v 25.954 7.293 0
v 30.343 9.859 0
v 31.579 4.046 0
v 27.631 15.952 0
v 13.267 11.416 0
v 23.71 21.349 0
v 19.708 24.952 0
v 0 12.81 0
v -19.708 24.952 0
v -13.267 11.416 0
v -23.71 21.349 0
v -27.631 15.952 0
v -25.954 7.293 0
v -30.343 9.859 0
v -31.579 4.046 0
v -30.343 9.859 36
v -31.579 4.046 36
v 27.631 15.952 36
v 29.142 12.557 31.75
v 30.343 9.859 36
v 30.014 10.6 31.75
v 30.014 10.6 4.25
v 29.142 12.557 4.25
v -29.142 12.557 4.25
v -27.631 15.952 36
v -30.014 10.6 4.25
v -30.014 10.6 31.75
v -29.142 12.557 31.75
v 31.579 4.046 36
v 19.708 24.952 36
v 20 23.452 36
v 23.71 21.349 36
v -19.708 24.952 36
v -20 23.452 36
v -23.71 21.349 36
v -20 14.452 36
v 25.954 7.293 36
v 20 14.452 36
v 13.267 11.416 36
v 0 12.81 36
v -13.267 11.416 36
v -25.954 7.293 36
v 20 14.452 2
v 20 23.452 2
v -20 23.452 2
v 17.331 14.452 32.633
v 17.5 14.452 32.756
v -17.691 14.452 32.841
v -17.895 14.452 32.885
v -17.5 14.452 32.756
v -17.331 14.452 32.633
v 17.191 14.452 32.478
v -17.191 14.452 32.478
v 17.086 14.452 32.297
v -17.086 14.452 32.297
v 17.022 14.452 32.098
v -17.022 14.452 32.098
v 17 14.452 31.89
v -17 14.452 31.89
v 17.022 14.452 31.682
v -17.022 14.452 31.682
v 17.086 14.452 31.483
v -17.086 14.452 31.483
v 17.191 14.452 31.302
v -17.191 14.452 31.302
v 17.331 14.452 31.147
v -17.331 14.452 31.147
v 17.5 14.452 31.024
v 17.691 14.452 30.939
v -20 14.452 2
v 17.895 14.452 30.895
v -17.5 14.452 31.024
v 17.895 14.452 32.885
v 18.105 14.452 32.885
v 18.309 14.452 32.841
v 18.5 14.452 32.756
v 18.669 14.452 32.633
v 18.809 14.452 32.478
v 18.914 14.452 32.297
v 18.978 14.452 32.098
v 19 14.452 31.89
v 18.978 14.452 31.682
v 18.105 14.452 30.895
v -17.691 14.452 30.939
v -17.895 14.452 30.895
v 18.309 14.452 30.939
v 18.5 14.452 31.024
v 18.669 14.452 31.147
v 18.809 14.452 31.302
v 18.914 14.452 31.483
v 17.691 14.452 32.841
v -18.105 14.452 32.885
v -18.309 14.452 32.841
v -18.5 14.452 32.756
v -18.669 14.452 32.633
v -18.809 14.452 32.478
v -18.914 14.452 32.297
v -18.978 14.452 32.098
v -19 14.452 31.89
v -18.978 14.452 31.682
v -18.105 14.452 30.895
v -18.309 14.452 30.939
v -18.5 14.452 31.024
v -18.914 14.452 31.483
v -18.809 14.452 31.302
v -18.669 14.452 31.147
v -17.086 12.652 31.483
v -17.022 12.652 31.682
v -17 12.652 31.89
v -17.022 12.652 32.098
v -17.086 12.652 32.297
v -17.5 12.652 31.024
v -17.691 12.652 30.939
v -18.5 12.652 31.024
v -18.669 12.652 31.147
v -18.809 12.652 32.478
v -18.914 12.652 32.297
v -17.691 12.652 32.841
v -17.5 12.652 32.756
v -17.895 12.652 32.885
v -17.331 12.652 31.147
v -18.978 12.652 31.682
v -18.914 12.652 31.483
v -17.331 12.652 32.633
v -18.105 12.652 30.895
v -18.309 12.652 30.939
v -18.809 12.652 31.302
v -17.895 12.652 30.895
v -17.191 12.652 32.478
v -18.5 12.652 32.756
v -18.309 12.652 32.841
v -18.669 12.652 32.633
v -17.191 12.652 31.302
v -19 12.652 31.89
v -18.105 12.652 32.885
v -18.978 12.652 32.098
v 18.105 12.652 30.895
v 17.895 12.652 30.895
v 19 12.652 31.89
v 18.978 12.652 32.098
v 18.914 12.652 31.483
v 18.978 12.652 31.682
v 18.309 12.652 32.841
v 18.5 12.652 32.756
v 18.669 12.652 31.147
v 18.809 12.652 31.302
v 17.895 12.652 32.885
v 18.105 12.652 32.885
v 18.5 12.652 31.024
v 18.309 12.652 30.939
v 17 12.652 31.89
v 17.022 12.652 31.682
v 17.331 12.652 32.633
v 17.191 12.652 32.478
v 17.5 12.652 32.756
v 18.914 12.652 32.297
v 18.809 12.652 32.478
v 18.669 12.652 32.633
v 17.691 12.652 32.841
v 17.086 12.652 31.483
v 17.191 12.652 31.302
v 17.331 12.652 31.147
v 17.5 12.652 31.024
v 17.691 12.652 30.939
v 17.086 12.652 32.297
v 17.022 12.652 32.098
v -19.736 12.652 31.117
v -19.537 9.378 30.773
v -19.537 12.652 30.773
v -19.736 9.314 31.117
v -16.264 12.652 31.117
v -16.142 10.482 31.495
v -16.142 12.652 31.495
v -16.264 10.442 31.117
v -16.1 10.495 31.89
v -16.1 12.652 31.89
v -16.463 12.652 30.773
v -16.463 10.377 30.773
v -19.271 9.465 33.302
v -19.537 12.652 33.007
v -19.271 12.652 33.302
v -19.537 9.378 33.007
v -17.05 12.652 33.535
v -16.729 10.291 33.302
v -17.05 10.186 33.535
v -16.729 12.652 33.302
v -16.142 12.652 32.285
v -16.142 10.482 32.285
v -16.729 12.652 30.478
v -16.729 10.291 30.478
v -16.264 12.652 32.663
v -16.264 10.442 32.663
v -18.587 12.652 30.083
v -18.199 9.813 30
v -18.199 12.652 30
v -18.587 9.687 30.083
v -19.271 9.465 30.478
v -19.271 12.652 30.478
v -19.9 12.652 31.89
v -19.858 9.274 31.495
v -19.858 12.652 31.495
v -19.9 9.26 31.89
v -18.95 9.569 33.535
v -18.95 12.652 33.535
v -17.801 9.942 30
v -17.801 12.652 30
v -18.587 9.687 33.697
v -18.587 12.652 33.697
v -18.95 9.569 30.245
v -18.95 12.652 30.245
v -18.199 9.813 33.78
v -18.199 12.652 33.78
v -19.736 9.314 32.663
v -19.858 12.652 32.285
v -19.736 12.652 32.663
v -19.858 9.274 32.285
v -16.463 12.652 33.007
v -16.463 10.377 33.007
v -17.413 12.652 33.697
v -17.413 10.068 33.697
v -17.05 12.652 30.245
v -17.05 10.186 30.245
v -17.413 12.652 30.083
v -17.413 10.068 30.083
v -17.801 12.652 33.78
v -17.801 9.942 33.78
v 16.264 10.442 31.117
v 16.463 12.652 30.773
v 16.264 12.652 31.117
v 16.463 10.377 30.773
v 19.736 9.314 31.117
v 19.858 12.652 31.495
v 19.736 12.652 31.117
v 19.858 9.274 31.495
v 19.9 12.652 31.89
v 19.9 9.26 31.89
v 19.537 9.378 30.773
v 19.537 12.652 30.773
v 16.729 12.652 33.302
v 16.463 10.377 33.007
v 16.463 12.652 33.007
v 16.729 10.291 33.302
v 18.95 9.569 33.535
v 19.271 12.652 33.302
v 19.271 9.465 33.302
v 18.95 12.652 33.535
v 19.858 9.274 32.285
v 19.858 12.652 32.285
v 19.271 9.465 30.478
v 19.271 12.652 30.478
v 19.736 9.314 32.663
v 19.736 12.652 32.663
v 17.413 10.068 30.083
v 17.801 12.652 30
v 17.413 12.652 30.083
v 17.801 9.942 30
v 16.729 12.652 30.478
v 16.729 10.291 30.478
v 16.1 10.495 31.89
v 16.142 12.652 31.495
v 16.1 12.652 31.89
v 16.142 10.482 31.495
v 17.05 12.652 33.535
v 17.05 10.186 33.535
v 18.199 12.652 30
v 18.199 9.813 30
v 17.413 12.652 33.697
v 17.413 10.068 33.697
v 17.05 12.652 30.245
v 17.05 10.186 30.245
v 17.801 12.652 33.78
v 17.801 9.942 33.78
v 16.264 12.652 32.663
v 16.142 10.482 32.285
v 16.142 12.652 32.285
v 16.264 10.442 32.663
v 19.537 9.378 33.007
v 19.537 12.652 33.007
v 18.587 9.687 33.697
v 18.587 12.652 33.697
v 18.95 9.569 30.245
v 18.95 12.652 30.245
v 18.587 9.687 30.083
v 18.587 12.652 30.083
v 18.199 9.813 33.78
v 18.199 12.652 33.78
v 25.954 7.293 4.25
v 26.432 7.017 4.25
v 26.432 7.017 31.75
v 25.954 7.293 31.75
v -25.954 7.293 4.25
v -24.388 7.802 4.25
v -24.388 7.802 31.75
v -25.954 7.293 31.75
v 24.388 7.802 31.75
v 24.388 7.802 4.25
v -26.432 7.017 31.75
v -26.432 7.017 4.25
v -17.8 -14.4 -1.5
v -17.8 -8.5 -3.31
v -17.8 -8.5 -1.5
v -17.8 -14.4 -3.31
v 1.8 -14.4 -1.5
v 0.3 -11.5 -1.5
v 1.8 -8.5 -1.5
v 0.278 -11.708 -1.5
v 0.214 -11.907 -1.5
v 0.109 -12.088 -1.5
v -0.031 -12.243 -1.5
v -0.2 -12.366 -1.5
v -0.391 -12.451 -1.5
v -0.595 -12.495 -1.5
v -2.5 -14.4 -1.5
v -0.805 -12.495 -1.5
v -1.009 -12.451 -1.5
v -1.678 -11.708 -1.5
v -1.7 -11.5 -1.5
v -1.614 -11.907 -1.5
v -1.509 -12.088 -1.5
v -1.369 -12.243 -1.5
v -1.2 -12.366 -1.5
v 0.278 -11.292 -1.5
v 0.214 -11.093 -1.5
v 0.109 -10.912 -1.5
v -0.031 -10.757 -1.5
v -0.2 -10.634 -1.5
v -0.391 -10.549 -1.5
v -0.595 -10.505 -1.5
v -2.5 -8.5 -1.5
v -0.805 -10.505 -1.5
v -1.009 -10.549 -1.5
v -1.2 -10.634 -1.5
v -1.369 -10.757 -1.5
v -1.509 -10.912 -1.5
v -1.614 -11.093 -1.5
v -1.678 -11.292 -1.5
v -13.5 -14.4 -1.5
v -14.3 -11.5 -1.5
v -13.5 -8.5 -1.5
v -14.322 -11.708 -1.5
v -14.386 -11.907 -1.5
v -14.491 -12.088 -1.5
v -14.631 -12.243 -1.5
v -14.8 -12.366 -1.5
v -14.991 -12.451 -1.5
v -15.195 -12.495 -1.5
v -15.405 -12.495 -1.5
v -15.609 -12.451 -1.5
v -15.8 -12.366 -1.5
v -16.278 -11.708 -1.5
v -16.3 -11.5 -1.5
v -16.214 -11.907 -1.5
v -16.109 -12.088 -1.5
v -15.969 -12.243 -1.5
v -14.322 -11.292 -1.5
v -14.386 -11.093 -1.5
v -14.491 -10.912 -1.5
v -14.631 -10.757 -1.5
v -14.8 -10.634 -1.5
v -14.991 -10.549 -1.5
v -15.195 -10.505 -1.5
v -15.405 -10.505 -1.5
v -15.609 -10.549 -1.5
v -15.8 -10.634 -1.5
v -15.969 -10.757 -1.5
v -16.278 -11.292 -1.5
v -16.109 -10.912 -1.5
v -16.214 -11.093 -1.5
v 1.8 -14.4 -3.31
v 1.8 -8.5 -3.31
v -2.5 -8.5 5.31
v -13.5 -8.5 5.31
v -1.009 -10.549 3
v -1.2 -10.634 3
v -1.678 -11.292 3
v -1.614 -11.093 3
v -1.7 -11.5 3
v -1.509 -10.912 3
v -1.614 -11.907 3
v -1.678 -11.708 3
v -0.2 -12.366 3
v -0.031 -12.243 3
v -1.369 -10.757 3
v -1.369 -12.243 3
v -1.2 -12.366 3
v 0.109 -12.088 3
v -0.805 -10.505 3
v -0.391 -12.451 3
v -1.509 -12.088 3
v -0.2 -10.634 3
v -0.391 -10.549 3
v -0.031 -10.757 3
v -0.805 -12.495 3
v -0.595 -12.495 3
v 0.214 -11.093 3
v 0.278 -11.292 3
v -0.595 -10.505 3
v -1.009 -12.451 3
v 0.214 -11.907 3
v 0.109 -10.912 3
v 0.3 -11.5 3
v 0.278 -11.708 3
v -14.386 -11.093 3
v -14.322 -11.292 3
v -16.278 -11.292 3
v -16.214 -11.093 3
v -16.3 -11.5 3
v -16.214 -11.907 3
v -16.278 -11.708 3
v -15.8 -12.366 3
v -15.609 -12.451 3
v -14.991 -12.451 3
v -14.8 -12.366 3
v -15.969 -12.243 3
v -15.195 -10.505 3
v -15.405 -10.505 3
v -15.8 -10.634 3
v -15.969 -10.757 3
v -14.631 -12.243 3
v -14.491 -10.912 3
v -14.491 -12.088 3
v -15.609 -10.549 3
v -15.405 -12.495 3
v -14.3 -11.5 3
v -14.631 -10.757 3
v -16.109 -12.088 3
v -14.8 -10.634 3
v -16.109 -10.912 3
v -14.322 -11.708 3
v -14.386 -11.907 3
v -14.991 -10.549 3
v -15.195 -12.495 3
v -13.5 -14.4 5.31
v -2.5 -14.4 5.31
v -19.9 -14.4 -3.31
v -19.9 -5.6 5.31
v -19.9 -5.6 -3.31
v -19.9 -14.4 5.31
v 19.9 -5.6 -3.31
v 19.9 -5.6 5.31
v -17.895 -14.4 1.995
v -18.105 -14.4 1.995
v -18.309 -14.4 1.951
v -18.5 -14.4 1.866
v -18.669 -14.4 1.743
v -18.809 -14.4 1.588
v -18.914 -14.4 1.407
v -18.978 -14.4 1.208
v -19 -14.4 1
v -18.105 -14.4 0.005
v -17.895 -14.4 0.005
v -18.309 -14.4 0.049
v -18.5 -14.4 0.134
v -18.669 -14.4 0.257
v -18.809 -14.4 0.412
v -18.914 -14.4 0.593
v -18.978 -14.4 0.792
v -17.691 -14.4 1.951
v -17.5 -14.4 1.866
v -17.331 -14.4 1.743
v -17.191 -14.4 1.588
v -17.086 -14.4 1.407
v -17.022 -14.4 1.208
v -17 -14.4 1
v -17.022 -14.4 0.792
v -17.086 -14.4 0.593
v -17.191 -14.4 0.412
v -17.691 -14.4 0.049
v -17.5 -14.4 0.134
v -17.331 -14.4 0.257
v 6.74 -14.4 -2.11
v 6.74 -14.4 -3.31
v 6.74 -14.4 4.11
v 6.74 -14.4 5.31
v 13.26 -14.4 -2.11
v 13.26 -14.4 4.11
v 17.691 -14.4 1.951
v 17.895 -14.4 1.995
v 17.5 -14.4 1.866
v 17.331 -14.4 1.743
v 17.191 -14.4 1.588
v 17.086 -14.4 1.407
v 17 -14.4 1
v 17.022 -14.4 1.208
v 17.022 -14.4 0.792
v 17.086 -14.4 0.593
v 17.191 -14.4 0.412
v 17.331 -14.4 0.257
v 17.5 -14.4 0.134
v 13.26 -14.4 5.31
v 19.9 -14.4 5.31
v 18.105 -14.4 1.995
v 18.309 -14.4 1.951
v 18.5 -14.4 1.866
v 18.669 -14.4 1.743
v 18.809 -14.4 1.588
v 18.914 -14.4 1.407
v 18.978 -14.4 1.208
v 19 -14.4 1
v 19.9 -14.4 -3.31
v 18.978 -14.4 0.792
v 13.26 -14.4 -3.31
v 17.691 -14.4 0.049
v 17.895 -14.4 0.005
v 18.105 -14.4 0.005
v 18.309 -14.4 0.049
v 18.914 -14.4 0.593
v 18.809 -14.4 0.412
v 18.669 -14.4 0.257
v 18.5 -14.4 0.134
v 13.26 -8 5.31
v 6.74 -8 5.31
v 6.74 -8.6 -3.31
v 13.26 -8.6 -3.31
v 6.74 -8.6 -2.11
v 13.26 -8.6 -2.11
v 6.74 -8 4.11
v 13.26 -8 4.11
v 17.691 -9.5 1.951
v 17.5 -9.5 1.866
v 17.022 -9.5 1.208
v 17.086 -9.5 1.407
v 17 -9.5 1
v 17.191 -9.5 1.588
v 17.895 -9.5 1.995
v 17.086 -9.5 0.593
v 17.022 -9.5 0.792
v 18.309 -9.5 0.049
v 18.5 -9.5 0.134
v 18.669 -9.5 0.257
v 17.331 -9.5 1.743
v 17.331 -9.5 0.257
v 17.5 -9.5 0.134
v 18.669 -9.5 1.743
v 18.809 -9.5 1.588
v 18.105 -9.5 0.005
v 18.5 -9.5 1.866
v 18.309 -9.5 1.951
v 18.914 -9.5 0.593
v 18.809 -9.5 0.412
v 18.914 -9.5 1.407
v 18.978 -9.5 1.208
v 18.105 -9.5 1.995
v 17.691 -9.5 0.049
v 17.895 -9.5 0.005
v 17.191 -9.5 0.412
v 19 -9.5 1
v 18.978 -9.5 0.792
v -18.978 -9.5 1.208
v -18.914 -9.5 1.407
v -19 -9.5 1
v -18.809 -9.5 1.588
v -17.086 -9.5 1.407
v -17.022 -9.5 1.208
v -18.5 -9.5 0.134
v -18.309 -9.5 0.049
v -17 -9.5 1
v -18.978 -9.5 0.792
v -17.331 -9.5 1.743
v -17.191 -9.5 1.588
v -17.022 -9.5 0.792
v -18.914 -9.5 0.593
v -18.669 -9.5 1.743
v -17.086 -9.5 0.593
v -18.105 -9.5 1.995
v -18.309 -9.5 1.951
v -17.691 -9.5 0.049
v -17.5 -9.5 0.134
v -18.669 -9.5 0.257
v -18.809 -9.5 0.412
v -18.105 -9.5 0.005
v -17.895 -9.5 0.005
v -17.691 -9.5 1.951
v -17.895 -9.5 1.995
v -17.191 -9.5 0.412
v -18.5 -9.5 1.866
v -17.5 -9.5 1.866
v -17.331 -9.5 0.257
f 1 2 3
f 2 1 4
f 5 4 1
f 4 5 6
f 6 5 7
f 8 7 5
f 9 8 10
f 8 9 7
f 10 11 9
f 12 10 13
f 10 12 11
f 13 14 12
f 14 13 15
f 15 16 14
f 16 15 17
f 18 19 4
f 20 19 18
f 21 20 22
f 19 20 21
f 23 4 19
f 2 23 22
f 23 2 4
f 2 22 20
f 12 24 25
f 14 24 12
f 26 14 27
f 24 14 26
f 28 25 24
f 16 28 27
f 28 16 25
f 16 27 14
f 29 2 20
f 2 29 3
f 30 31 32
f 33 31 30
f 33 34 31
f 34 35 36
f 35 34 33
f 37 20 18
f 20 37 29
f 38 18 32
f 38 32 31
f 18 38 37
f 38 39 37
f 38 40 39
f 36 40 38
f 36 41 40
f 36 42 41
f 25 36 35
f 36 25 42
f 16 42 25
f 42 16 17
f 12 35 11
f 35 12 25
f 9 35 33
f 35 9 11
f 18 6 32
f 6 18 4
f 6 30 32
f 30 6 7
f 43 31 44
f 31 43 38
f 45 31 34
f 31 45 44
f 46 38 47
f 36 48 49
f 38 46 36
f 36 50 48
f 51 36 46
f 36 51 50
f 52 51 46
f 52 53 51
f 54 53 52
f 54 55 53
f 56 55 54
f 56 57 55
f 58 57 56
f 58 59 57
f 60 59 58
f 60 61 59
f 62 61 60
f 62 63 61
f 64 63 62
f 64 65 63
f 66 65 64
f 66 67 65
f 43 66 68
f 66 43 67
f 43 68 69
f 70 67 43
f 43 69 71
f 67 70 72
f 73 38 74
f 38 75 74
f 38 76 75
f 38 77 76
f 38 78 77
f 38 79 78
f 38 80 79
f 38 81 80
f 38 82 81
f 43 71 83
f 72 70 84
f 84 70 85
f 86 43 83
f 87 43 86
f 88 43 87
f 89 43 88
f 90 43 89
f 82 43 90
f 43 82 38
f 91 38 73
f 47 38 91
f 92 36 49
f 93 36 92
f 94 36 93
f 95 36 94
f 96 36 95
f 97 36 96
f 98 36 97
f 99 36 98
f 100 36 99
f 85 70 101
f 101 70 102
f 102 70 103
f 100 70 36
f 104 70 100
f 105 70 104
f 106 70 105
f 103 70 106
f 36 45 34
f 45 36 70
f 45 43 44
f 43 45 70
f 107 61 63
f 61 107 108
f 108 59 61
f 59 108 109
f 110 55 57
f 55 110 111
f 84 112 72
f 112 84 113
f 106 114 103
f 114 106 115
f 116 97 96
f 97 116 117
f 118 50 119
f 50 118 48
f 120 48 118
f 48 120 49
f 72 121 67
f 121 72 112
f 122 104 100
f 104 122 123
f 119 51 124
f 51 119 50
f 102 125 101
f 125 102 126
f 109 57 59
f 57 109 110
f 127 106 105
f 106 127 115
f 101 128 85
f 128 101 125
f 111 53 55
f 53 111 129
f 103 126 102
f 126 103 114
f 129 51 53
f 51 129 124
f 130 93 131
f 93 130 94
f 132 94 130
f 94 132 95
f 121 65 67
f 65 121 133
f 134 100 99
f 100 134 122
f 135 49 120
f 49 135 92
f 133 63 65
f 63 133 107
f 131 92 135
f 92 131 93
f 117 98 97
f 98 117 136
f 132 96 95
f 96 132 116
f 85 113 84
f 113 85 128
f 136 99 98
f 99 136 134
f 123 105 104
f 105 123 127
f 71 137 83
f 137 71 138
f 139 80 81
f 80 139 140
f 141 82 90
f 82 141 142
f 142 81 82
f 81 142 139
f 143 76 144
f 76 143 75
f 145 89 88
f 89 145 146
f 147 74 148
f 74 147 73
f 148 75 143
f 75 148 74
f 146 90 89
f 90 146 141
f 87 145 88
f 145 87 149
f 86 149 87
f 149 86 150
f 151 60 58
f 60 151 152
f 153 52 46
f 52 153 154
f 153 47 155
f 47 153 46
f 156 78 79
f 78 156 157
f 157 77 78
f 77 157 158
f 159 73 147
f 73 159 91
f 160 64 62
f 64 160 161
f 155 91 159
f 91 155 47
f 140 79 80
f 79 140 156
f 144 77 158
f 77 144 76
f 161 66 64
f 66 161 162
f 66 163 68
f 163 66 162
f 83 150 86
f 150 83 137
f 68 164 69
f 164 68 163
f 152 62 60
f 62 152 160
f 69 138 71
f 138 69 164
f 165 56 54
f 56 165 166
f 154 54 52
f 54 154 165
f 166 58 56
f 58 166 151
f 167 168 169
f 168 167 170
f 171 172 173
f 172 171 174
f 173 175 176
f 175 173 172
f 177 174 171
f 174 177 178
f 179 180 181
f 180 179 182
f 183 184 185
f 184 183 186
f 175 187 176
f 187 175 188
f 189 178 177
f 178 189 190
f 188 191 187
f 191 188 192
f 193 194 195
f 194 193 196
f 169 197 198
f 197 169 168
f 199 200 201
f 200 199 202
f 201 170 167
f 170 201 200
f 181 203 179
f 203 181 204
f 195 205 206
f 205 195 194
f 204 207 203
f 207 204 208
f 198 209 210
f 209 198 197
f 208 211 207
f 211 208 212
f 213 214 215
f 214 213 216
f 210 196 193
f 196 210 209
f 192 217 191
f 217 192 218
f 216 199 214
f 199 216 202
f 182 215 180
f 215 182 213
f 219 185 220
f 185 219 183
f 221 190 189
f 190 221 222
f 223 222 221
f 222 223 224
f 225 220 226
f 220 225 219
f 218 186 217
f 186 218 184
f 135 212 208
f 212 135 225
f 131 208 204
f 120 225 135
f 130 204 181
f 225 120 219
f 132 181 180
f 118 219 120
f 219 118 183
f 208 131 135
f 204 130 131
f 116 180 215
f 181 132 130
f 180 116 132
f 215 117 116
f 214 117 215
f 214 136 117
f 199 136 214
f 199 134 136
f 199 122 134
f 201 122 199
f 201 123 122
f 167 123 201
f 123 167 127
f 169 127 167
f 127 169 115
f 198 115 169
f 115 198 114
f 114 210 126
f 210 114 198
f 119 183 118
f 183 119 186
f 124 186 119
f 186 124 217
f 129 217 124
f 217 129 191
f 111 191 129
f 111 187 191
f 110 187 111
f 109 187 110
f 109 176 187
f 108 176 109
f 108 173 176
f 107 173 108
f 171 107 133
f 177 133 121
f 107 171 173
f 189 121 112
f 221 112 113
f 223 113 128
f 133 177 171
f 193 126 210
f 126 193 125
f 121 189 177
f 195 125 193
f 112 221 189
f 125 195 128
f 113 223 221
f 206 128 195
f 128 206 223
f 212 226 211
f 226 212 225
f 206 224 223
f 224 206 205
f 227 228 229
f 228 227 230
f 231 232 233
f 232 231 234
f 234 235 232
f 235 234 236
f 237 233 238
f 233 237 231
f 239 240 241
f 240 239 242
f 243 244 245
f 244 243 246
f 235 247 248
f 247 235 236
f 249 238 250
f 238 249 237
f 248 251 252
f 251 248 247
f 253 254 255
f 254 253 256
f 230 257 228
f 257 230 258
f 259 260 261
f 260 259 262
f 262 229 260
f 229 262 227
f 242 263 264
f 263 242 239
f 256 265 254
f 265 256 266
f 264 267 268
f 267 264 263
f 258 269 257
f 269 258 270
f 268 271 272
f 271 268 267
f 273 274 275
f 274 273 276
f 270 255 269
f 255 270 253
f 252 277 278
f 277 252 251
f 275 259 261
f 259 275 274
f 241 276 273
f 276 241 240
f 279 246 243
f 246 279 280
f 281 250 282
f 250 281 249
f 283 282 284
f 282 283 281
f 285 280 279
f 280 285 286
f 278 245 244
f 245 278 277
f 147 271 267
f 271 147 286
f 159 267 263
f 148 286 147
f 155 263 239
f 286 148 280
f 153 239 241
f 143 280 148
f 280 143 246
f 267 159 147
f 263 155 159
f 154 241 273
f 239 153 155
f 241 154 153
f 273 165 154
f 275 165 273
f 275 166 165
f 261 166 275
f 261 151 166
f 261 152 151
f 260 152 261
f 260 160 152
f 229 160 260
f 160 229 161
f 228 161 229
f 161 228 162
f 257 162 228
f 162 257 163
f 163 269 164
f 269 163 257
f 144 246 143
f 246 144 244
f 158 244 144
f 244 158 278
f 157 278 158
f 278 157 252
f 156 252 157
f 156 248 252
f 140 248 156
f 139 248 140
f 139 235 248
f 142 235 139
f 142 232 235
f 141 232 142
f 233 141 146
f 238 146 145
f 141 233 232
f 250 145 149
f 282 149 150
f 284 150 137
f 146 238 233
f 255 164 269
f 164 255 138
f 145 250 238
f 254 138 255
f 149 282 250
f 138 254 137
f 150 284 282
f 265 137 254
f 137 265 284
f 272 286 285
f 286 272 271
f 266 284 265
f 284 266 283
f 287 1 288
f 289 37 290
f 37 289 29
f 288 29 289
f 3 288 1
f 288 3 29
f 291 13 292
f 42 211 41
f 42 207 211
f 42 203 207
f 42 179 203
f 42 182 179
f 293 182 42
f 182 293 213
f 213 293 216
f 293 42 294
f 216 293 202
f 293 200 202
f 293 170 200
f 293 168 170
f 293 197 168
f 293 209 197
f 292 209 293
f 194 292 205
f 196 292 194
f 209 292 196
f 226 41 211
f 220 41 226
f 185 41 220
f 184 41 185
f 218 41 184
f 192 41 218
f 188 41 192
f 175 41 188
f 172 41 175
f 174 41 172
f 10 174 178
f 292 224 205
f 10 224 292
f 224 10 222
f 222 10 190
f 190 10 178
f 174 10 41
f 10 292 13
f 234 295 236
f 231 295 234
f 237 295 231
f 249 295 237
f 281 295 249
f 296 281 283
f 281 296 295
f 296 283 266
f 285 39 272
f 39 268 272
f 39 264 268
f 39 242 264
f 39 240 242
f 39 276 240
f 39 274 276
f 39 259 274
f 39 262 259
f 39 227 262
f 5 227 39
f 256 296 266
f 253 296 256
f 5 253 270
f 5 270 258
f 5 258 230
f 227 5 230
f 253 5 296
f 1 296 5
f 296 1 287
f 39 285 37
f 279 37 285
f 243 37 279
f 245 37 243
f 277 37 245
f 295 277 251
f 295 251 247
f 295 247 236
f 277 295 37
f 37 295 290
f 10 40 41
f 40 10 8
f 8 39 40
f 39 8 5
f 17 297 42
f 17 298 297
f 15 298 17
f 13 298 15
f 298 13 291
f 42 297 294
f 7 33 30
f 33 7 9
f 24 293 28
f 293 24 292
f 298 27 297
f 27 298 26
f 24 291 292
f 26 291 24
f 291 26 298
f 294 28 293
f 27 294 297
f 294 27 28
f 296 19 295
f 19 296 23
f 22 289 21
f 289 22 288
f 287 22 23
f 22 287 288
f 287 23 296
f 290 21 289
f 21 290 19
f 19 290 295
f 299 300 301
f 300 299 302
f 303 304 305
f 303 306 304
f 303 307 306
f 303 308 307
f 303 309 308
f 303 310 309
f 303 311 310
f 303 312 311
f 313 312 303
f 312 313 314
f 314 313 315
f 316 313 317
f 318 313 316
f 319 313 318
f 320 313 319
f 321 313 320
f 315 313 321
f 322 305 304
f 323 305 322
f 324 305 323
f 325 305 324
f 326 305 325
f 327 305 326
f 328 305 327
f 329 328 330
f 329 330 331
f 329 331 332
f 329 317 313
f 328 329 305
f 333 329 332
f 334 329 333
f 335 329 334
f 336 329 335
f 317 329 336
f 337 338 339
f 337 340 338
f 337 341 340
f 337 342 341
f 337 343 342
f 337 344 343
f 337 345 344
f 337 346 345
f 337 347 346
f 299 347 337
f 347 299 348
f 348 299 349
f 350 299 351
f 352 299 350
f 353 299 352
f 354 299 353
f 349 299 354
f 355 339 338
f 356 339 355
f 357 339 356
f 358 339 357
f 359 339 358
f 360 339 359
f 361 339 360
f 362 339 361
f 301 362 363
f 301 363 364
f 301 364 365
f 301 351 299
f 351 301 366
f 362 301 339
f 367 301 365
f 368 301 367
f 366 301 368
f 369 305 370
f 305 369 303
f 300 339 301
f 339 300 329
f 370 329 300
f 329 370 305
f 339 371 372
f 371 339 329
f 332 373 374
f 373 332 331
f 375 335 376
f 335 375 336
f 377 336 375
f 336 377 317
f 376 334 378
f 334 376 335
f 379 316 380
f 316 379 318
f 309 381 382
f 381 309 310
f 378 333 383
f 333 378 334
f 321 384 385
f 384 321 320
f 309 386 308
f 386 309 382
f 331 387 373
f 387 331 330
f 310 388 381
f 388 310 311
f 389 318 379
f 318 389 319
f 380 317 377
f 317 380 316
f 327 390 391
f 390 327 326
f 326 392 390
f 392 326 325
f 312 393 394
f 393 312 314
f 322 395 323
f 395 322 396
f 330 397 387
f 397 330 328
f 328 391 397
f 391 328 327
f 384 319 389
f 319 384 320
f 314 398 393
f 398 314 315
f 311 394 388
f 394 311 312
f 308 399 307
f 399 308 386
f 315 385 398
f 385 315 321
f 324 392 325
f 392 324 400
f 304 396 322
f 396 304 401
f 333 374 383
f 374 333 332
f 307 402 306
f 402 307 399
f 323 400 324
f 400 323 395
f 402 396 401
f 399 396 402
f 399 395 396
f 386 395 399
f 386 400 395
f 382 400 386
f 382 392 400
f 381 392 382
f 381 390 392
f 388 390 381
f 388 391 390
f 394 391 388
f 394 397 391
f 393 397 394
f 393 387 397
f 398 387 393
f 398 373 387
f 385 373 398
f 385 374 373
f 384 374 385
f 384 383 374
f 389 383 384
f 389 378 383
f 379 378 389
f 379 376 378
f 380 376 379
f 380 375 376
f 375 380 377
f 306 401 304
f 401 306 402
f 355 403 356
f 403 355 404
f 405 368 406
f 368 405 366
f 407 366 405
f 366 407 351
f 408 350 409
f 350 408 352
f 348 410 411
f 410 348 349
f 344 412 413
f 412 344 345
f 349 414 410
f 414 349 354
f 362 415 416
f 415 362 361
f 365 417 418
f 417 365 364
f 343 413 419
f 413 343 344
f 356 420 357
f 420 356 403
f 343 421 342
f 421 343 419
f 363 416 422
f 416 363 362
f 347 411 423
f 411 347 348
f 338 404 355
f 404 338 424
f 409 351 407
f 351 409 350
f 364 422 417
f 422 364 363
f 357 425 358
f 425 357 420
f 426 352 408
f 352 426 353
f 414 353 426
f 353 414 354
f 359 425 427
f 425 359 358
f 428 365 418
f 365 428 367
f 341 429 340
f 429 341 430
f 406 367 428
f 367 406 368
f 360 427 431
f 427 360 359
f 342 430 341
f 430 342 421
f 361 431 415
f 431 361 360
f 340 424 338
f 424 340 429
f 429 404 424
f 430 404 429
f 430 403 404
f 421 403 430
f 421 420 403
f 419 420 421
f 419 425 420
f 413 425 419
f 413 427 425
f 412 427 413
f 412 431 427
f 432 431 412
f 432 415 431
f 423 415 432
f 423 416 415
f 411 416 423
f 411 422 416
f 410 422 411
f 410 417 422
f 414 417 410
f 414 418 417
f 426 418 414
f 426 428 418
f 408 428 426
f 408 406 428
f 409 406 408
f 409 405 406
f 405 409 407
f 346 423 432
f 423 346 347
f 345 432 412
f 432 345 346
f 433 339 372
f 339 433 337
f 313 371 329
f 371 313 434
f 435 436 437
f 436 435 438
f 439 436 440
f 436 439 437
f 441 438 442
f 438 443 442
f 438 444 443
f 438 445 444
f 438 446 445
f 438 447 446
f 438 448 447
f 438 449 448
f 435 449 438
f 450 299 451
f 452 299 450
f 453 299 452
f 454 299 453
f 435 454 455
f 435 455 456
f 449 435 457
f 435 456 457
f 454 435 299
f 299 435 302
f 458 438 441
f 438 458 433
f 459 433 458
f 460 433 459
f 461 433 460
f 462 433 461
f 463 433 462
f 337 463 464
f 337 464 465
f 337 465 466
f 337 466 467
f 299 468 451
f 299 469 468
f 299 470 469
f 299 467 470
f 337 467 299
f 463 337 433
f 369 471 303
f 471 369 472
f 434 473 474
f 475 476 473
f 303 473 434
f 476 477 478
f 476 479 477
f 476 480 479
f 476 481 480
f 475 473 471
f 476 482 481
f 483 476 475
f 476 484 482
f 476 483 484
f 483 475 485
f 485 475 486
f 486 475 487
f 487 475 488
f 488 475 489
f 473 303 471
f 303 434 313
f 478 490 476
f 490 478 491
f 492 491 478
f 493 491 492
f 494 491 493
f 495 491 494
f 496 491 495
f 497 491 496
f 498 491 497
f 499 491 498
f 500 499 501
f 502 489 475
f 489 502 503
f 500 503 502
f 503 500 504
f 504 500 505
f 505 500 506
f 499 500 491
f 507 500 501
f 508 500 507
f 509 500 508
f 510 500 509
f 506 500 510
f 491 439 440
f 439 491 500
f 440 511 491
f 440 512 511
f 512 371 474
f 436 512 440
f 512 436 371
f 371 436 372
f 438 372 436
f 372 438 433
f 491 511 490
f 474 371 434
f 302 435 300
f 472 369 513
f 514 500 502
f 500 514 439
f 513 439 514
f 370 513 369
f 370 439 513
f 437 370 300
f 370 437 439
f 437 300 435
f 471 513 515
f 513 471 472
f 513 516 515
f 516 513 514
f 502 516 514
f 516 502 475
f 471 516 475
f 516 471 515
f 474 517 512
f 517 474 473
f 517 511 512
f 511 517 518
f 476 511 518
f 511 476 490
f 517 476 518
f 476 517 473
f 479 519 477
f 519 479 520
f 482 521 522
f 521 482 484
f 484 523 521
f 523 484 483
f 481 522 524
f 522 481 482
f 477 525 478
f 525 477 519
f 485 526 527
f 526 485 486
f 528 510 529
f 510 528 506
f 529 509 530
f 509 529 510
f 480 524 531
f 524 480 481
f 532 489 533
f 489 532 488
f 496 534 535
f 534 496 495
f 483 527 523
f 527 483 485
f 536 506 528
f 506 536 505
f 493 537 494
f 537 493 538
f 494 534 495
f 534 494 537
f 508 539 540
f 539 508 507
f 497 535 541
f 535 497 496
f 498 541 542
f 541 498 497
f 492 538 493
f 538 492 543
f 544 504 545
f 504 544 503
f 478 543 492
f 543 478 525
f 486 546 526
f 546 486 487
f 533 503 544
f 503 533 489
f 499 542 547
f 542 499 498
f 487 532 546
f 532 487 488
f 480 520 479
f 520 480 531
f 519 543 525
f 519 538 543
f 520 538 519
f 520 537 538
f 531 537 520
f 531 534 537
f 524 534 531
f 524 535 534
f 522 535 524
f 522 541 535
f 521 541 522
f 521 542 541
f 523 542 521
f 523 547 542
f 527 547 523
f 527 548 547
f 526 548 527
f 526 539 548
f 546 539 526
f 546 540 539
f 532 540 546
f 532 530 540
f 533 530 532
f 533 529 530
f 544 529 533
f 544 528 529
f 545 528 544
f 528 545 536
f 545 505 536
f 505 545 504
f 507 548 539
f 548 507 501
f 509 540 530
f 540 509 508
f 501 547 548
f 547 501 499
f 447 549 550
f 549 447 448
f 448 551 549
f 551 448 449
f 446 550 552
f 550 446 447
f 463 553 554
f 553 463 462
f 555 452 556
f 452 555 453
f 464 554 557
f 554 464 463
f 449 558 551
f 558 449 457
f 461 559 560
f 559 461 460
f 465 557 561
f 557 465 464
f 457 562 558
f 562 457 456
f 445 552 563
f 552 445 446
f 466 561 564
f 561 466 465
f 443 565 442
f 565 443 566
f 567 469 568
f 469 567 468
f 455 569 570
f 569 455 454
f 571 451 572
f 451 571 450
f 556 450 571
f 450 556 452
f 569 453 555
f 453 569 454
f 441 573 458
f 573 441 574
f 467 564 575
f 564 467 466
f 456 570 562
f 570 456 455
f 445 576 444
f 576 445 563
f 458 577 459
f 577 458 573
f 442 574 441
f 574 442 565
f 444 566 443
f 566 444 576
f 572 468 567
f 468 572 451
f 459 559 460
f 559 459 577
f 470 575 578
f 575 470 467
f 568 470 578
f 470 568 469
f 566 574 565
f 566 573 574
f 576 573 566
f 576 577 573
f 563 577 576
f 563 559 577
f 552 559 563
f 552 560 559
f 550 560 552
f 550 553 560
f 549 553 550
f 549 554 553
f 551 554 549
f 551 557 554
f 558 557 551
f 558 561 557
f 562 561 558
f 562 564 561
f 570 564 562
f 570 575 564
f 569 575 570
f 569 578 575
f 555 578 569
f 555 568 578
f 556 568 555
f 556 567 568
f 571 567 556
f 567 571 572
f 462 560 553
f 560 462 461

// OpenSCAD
//2020-09-16
//WristbandBattery.scad
//https://github.com/degenerator0/
//https://www.instructables.com/member/degenerator0/
//https://www.thingiverse.com/degenerator/
//Battery chassis for Laserclaw project


$fs=.01;

XH254_BACK_X=5.75;
XH254_BACK_Y=7.95;
XH254_BACK_Z=5.75;
XH254_FRONT_X=7.52;
XH254_FRONT_Y=6.22;
XH254_FRONT_Z=6.40;
XH254_X=XH254_BACK_X+XH254_FRONT_X;
XH254_Y=XH254_BACK_Y+XH254_FRONT_Y;
XH254_Z=XH254_BACK_Z+XH254_FRONT_Z;
BATTERY_X=40;
BATTERY_Y=20;
BATTERY_Z=9;
2P_F_BOT_X=4.0;
2P_F_BOT_Y=6.5;
2P_F_BOT_Z=.85;
2P_F_TOP_X=4.0;
2P_F_TOP_Y=4.61;
2P_F_TOP_Z=2.15-.85;
2P_F_Z=2P_F_TOP_Z+2P_F_BOT_Z;
2P_B_X=5.4;
2P_B_Y=4.61;
2P_B_Z=2.63;
2P_X=2P_F_BOT_X+2P_B_Y;
2P_Y=2P_F_BOT_Y;
2P_Z=(2P_F_TOP_Z/2+2P_F_BOT_Z/2+2P_B_Z/2)/3;
SSWITCH_B_X=11;
SSWITCH_B_Y=6;
SSWITCH_B_Z=4.5;
SSWITCH_P_X=19.6;
SSWITCH_P_Y=6;
SSWITCH_P_Z=1;
SSWITCH_T_X=1.4;
SSWITCH_T_Y=.4;
SSWITCH_T_Z=2.25;

WRISTBAND_H=36;
WRISTBAND_D=BATTERY_X+2P_X+5.2+9+1;

module XH254 () {
}

module slideswitch () {
    $fs=.01;
    union () {
    //plate

        cube ([SSWITCH_P_X,SSWITCH_P_Y,SSWITCH_P_Z], center = true);
        
        translate ([-SSWITCH_P_X/2+2.5,0,-SSWITCH_P_Z/2])
        cylinder (h=SSWITCH_B_Z*2, r=1, center = true);
            translate ([SSWITCH_P_X/2-2.5,0,-SSWITCH_P_Z/2])
        cylinder (h=SSWITCH_B_Z*2, r=1, center = true);

    }
    

    
    //body
      translate ([0,0,-SSWITCH_P_Z/2-SSWITCH_B_Z/2])
      cube ([SSWITCH_B_X,SSWITCH_B_Y,SSWITCH_B_Z], center = true);
    //terminal
        translate ([0,0,-SSWITCH_P_Z/2-SSWITCH_B_Z-SSWITCH_T_Z/2])
        cube ([SSWITCH_T_X,SSWITCH_T_Y,SSWITCH_T_Z], center = true);
    translate ([-SSWITCH_T_X*2,0,-SSWITCH_P_Z/2-SSWITCH_B_Z-SSWITCH_T_Z/2])
        cube ([SSWITCH_T_X,SSWITCH_T_Y,SSWITCH_T_Z], center = true);
        translate ([SSWITCH_T_X*2,0,-SSWITCH_P_Z/2-SSWITCH_B_Z-SSWITCH_T_Z/2])
        cube ([SSWITCH_T_X,SSWITCH_T_Y,SSWITCH_T_Z], center = true);

}
module powerhouse () {
    cube ([BATTERY_X+2P_X+5.2+5,WRISTBAND_H,BATTERY_Z+15], center = true);
    
}


    
module wristband () {
    
    union (){
        difference () {
            union () {
                difference () {
                    //center
                    translate ([0,0,0])
                        rotate ([0,90,90])
                            cylinder(h=WRISTBAND_H, d=WRISTBAND_D,  center = true);
                    
                     //inner
                    translate ([0,0,0])
                        rotate ([0,90,90])
                            cylinder (h=WRISTBAND_H, d=WRISTBAND_D-4,center = true);
                }
                //powerhouse
                        translate ([0,0,WRISTBAND_D/4+1])
                            powerhouse ();
            }
           //cutouts
            
                //outer
                difference () {
                    translate ([0,0,0])
                        rotate ([0,90,90])
                            cylinder (h=WRISTBAND_H, d=WRISTBAND_D+17,center = true);
                    translate ([0,0,0])
                        rotate ([0,90,90])
                            cylinder(h=WRISTBAND_H, d=WRISTBAND_D,  center = true);
                }
                //inner lower
                translate ([0,0,-51])
                    rotate ([0,90,90])
                        cylinder(h=WRISTBAND_H, d=2*WRISTBAND_D,  center = true);
            
                //top
                translate ([0,0,WRISTBAND_D/4+1+BATTERY_Z+11])            
                    powerhouse ();
            
    
                //battery
                union () {
                    translate ([0,-2,WRISTBAND_D/4+3])
                        cube ([BATTERY_X,BATTERY_Y+16,BATTERY_Z], center = true);
            
                //bottom screws
                translate ([-BATTERY_X/2+2,-WRISTBAND_H/2+(XH254_FRONT_Y+2)/2,WRISTBAND_D/4-5])
                    cylinder (h=10, d=2, center = true);
                translate ([+BATTERY_X/2-2,-WRISTBAND_H/2+(XH254_FRONT_Y+2)/2,WRISTBAND_D/4-5])
                    cylinder (h=10, d=2, center = true);
    
                translate ([-BATTERY_X/2+2,-WRISTBAND_H/2+(XH254_FRONT_Y+2)/2,WRISTBAND_D/4-5.4])
                    cylinder (h=4.2, d=3.8, center = true);
    
                translate ([+BATTERY_X/2-2,-WRISTBAND_H/2+(XH254_FRONT_Y+2)/2,WRISTBAND_D/4-5.4])
                    cylinder (h=4.2, d=3.8, center = true);

              }
            
        
            //left strap
                translate ([-28,0,10])
                    rotate ([0,45,0])
                        cube ([20,WRISTBAND_H-8.5,2], center = true);

            //right strap
                translate ([28,0,10])
                    rotate ([0,-45,0])
                        cube ([20,WRISTBAND_H-8.5,2], center = true);
            }

    }
      
}

module endcap () {
    
    difference () {
        //plate
        cube ([BATTERY_X-.2,XH254_FRONT_Y+2.4,BATTERY_Z-.2], center = true);
       
        //connector
        translate ([-BATTERY_X/4,XH254_Y/2-.2,-BATTERY_Z/2+XH254_FRONT_Z/2+.4])
            rotate ([0,180,180])
                XH254 ();
        translate ([-BATTERY_X/4,XH254_Y/2+.2,-BATTERY_Z/2+XH254_FRONT_Z/2+.4])
            rotate ([0,180,180])
                XH254 ();
           
        translate ([-BATTERY_X/4,-(XH254_FRONT_Y+1.2)/2,-BATTERY_Z/2+XH254_FRONT_Z/2-.5])
            cube ([XH254_FRONT_X-1,1.2,XH254_FRONT_Z], center = true);
        
        translate ([-BATTERY_X/4,(XH254_FRONT_Y+1.2)/2,-BATTERY_Z/2+XH254_FRONT_Z/2+.1])
            cube ([XH254_FRONT_X-1,1.2,XH254_FRONT_Z], center = true);
     
        //switch
        translate ([BATTERY_X/4-2,-3,-BATTERY_Z/2+SSWITCH_P_Y/2])
            rotate ([90,0,0])
                slideswitch ();
        
        translate ([BATTERY_X/4-2,+4,-BATTERY_Z/2+SSWITCH_P_Y/2])
            rotate ([90,0,0])
                cube ([SSWITCH_B_X,SSWITCH_B_Y,SSWITCH_B_Z], center = true);
                
        translate ([BATTERY_X/4-2,-4,-BATTERY_Z/2+SSWITCH_P_Y/2])
            rotate ([90,0,0])
                cube ([SSWITCH_P_X,SSWITCH_P_Y,SSWITCH_P_Z], center = true);
     
        //bottom screws       
        translate ([-BATTERY_X/2+2,0,-BATTERY_Z/2])
            cylinder (h=10, d=2, center = true);
            
        translate ([BATTERY_X/2-2,0,-BATTERY_Z/2])
            cylinder (h=10, d=2, center = true);
    }
}     


 


translate ([0,0,WRISTBAND_H/2]) 
rotate ([-90,0,0])
wristband ();



translate ([0,-10,1]) 
rotate ([90,0,180])
endcap ();
